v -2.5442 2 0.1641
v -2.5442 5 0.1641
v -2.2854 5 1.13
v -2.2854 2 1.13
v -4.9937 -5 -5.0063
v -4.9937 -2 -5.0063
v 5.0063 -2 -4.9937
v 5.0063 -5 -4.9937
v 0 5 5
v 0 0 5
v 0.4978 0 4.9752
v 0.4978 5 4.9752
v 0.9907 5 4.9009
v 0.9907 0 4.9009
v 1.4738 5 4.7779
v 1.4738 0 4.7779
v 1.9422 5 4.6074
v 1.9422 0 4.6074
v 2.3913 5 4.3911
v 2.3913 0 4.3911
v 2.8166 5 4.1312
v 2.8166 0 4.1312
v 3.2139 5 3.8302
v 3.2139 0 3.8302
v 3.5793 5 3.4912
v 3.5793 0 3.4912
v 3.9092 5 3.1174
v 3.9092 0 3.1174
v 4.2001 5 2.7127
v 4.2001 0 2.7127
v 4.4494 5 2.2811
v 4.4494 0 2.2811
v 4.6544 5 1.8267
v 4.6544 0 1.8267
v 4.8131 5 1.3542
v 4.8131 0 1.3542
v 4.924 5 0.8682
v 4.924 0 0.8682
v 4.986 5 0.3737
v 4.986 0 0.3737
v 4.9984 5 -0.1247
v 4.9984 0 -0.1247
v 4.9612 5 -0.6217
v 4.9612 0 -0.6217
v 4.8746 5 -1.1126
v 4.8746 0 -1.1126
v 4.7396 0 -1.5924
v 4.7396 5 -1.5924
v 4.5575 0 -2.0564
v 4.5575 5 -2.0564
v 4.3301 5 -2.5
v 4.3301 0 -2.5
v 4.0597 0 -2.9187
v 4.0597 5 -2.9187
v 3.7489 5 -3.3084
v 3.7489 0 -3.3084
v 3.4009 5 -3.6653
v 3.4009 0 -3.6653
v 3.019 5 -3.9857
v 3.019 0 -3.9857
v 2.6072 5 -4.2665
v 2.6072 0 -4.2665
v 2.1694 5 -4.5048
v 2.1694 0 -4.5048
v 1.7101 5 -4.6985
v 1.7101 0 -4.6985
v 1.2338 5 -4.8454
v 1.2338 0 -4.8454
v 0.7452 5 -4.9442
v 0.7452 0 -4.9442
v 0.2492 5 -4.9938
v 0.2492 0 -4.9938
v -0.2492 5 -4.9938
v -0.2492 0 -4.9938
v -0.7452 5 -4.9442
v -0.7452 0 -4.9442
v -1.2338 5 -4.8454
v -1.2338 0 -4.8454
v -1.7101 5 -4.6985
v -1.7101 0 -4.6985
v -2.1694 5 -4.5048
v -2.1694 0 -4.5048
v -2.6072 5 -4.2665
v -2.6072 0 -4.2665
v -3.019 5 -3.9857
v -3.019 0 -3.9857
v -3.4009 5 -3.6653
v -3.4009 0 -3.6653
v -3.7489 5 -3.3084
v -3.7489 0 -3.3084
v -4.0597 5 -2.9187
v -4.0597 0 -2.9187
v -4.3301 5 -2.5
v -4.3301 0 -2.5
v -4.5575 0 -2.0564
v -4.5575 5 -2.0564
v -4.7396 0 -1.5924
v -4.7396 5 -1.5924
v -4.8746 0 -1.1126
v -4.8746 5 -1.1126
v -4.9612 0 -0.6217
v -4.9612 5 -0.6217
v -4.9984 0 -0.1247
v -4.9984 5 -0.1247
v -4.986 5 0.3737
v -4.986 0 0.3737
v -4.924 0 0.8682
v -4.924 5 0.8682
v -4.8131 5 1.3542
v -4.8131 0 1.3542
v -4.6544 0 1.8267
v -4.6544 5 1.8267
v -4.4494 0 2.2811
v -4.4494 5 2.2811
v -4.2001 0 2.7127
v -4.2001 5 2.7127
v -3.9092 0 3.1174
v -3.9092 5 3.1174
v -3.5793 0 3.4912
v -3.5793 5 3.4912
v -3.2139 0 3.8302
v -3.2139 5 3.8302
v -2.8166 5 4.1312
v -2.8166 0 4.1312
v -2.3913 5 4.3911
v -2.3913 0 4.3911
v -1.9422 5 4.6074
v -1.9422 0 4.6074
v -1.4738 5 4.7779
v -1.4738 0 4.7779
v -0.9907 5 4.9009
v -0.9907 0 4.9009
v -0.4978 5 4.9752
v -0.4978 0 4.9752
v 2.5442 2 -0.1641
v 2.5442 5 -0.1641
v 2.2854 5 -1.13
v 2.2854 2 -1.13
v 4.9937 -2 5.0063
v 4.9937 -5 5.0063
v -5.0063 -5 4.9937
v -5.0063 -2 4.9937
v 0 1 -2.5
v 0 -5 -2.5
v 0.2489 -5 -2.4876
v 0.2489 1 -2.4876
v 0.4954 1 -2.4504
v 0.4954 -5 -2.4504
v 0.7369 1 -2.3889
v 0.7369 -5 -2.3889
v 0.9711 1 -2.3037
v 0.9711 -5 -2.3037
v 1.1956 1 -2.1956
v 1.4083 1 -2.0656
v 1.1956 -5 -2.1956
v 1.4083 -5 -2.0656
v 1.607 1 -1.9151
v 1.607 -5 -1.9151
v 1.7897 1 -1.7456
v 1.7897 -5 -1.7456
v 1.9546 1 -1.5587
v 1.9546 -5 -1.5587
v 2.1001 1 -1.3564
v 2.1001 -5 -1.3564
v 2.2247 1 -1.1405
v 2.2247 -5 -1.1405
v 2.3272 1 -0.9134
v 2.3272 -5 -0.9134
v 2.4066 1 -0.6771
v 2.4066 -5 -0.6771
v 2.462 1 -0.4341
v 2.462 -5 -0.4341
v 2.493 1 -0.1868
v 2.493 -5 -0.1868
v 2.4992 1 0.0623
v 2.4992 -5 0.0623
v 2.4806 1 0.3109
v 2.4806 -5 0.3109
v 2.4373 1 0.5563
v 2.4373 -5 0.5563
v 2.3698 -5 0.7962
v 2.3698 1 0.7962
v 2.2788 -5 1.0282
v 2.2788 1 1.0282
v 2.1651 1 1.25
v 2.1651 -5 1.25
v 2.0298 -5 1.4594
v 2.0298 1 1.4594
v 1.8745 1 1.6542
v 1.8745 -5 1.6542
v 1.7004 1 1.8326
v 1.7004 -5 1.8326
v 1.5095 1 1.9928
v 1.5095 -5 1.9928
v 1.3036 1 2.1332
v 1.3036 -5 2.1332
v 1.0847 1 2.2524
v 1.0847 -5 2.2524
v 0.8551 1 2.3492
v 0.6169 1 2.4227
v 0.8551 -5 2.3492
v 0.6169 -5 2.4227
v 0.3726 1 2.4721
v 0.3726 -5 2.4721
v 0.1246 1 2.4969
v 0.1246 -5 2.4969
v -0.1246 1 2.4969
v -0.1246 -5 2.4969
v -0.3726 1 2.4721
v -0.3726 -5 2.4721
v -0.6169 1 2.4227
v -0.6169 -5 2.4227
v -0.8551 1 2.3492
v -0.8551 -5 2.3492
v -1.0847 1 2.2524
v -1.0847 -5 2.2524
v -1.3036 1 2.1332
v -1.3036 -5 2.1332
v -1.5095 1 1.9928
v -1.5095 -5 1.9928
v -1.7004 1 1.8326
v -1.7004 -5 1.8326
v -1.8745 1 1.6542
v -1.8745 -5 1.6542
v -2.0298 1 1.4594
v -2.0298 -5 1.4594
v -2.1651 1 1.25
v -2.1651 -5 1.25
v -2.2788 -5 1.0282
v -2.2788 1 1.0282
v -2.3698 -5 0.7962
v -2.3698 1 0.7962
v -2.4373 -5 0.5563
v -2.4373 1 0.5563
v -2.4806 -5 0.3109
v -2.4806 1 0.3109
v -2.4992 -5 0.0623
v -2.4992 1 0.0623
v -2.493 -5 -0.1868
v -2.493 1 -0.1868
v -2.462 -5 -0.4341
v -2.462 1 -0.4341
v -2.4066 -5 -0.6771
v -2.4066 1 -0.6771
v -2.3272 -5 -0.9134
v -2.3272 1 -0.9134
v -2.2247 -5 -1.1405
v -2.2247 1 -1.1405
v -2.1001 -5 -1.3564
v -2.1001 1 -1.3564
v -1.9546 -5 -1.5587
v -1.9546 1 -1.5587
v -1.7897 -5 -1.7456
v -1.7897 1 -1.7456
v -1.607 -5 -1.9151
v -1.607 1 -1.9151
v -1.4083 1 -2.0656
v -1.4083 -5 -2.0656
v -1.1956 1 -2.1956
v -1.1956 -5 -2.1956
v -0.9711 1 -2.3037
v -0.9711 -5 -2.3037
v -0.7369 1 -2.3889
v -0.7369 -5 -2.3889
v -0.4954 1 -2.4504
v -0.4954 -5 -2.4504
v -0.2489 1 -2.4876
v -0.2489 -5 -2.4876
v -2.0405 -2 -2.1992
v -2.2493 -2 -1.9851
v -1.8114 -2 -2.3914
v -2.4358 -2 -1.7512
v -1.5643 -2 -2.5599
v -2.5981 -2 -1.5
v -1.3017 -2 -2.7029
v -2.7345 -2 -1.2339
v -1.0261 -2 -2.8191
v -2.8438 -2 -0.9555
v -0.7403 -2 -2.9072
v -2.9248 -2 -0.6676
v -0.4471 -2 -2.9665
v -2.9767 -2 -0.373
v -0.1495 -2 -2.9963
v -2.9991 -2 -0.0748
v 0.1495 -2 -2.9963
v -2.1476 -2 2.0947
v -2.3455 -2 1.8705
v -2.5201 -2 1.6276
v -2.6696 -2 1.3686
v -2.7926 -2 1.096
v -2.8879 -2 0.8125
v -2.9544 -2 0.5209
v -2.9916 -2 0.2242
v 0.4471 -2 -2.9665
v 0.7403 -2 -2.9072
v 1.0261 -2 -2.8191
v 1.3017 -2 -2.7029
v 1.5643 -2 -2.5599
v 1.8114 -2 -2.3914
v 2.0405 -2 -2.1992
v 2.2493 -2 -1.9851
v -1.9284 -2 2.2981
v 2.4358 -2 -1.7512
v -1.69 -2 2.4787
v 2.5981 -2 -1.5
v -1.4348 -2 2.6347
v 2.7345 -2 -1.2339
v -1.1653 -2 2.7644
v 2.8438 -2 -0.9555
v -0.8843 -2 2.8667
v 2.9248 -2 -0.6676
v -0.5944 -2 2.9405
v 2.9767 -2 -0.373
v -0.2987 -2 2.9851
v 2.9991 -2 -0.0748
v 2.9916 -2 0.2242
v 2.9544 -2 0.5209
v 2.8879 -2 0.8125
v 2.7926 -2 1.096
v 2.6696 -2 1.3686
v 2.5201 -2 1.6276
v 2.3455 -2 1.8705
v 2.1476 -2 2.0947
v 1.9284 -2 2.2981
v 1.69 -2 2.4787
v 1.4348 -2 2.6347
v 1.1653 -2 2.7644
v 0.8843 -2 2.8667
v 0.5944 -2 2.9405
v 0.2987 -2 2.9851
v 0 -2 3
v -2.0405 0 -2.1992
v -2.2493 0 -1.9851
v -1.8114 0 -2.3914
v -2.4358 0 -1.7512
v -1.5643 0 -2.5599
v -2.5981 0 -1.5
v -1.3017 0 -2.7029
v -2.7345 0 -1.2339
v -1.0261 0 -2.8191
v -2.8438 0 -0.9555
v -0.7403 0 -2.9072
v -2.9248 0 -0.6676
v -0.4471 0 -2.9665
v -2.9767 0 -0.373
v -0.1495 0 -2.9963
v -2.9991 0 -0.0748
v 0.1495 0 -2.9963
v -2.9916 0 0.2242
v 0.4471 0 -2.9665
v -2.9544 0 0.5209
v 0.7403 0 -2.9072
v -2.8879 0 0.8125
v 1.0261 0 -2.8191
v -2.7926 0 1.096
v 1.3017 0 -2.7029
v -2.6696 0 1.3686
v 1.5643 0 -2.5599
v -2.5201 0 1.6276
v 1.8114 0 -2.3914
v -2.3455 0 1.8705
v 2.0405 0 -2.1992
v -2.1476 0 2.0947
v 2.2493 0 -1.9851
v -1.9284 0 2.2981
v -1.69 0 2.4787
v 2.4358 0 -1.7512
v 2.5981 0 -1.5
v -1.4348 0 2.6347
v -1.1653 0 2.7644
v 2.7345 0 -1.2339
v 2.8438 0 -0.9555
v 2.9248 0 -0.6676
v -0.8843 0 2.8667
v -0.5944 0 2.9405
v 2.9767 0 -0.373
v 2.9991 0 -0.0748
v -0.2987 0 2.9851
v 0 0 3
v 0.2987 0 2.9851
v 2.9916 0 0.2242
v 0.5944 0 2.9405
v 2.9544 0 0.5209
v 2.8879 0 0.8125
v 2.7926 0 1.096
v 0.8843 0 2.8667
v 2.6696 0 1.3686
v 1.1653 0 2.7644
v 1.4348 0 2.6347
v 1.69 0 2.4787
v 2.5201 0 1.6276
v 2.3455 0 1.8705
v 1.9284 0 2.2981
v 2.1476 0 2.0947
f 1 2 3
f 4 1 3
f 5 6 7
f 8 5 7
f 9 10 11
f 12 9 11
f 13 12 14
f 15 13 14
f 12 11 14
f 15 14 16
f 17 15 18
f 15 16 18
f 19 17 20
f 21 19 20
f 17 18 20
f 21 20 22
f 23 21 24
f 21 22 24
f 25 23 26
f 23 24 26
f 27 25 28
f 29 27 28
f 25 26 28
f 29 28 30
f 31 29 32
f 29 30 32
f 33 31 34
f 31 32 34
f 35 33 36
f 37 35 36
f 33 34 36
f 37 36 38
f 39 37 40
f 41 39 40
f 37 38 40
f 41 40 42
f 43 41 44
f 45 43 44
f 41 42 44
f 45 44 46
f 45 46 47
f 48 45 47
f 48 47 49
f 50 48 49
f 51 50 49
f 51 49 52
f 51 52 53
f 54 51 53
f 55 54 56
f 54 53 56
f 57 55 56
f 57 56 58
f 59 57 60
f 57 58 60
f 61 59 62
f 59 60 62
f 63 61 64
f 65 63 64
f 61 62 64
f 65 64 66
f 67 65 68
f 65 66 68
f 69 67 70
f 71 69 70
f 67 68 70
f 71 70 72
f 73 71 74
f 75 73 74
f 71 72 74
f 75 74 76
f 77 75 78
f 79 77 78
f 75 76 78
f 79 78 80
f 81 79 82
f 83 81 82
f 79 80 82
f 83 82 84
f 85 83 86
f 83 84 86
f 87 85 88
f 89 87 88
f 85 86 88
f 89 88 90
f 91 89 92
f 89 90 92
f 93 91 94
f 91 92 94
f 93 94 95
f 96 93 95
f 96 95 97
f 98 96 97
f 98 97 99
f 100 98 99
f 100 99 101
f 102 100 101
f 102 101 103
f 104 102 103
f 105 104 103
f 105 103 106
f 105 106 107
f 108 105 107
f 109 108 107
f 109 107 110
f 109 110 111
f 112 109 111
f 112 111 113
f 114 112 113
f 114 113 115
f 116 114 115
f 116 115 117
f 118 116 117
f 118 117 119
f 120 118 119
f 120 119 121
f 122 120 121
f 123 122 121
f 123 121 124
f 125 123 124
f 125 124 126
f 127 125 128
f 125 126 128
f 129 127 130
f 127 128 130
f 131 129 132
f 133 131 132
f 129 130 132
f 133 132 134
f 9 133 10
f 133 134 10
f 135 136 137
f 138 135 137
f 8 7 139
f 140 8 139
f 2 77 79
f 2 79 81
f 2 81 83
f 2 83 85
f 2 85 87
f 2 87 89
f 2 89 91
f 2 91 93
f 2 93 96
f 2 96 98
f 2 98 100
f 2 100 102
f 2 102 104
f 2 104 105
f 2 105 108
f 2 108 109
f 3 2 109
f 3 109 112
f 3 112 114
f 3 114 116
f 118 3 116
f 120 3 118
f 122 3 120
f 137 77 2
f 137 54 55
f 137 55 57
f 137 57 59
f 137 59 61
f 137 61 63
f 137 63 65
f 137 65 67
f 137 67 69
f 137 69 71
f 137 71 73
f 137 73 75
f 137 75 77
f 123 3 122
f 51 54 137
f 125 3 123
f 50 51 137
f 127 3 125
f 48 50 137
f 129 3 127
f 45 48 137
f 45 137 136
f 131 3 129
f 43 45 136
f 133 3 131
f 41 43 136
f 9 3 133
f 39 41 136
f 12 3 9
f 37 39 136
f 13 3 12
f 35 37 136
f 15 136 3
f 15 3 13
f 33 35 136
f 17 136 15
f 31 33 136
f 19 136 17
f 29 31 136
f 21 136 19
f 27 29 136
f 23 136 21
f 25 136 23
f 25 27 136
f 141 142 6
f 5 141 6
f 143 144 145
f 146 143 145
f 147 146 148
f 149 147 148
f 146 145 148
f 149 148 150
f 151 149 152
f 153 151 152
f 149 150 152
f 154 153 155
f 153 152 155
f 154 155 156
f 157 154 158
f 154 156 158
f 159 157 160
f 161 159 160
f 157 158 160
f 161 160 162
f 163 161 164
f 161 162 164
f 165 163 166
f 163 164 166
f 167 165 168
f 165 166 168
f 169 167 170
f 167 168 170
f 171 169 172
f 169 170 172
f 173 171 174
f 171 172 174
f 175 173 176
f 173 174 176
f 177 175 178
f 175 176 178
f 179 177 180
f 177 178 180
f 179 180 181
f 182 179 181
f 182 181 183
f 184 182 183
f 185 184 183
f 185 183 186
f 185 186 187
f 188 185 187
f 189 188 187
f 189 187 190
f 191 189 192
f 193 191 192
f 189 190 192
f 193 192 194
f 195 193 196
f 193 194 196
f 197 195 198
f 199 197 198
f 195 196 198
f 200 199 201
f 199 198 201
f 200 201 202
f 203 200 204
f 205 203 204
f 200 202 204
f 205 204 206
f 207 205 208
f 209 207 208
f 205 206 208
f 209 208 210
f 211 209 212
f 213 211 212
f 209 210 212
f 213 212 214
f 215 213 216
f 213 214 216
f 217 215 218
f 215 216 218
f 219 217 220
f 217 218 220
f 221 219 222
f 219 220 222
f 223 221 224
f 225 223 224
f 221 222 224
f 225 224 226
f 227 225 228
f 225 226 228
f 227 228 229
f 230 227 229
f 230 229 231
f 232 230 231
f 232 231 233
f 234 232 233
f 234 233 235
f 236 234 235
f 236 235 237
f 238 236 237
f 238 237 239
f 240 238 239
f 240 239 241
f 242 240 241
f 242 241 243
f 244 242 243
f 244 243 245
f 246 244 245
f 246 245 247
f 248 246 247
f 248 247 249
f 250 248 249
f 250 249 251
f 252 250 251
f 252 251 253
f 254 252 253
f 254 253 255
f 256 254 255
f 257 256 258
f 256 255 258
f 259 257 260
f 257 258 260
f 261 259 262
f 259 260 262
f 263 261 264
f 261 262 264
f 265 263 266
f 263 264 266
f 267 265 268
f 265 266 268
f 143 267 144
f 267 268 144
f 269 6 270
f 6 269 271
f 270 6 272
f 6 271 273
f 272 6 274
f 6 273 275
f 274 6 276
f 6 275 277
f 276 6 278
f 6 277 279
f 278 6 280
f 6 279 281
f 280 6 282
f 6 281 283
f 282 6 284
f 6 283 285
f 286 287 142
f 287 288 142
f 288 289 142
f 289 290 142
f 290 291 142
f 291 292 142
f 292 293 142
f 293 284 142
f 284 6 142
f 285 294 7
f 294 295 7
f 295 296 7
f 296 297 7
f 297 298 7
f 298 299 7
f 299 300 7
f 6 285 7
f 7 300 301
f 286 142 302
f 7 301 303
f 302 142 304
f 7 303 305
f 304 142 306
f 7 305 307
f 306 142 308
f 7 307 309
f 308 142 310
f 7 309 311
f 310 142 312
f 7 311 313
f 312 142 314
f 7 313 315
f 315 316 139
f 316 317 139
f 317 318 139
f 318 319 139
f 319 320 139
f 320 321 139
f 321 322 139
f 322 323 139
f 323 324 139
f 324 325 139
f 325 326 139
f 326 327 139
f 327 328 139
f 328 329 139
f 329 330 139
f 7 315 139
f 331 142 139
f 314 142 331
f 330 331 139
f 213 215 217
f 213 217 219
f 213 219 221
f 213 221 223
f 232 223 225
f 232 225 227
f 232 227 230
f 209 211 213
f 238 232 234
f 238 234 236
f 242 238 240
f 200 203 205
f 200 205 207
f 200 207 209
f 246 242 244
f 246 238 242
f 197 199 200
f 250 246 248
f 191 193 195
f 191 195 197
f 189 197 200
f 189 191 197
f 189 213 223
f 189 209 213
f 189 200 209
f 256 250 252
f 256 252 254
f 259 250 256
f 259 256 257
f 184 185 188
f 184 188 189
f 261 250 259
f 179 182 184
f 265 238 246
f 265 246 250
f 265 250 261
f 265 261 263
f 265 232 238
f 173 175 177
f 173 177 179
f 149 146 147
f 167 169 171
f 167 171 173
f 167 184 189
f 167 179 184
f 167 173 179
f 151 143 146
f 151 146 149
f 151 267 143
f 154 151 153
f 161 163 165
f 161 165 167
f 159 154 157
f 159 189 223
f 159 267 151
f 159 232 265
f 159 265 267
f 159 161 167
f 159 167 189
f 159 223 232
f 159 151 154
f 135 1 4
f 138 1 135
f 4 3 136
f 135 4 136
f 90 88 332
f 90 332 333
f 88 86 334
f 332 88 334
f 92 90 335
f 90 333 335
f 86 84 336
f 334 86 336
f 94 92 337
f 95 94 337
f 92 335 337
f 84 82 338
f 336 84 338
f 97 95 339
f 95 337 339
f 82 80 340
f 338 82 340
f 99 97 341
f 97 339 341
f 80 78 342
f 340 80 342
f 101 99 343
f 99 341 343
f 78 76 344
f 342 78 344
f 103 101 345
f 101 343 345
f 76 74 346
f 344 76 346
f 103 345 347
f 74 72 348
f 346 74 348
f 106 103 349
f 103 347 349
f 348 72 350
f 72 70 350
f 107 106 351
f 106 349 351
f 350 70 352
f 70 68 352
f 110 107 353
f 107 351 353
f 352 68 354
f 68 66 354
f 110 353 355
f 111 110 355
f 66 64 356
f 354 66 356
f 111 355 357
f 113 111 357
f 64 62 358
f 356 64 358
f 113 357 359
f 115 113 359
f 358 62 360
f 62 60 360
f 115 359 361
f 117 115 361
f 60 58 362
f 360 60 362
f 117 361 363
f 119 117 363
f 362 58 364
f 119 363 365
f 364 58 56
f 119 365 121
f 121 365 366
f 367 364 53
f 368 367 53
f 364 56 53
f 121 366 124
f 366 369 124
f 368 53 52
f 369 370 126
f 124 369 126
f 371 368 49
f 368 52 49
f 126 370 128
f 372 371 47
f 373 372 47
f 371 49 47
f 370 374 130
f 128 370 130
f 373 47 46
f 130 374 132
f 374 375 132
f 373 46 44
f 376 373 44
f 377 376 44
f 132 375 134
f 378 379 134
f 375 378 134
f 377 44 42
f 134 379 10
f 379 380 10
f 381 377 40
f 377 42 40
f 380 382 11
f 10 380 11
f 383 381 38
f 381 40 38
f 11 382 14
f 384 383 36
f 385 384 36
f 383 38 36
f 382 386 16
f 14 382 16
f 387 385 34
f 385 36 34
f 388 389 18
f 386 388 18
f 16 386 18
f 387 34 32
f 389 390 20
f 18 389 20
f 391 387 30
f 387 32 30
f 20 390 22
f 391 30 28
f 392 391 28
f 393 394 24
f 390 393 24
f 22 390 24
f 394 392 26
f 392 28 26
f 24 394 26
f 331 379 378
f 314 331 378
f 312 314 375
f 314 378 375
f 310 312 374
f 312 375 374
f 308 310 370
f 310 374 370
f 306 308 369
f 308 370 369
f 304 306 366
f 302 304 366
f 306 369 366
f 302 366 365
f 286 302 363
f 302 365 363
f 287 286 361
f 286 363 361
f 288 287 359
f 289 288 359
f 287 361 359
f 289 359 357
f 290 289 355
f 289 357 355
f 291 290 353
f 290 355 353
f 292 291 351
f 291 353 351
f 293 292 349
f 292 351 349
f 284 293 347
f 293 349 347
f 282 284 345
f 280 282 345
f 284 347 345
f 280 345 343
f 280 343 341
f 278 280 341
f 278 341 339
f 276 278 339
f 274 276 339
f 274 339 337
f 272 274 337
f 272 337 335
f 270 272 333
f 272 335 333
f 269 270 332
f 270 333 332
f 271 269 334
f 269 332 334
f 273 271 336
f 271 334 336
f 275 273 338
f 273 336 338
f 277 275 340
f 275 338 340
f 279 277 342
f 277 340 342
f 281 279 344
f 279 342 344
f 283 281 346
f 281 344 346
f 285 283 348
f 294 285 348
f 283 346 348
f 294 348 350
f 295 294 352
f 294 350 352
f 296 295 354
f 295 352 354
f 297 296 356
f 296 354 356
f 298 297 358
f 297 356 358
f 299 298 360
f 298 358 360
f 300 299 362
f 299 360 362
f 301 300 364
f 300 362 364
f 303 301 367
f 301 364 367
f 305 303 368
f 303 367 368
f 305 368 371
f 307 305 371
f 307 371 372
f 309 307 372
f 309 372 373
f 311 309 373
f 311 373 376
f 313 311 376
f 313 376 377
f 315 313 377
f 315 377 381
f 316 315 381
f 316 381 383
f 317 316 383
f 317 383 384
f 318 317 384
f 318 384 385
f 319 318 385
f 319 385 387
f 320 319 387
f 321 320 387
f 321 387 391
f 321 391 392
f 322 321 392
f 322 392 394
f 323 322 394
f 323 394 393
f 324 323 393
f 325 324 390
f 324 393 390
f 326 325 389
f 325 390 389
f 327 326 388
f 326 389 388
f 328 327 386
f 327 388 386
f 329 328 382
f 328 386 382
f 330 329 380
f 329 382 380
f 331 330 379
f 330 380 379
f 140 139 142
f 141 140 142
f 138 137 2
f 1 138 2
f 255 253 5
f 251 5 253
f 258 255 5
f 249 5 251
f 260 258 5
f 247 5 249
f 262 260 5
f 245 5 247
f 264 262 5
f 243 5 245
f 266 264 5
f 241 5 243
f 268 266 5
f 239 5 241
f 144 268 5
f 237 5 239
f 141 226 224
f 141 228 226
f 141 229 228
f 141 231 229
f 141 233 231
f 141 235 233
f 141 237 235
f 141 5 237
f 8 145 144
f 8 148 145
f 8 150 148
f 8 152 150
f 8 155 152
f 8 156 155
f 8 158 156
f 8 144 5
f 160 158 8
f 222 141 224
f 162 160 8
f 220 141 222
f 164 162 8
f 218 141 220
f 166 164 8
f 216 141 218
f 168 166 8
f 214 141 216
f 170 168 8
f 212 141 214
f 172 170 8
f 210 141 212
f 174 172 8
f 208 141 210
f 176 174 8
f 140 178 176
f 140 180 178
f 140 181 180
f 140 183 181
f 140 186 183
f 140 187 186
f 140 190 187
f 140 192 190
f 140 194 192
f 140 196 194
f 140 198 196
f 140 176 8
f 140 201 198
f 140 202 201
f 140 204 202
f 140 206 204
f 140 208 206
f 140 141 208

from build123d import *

# Parameters (mm, degrees)
SKETCH_1_R          = 5
EXTRUDE_1_DEPTH     = 5
SKETCH_3_R          = 3
EXTRUDE_2_DEPTH     = 2
EXTRUDE_3_DEPTH     = 3
SKETCH_5_R          = 2.5
CUT_EXTRUDE_2_DEPTH = 6
CUT_EXTRUDE_1_DEPTH = 3


with BuildPart() as part:
    # 草图1 → 凸台-拉伸1 (new body)
    with BuildSketch(Plane(origin=(0, 0, 0), x_dir=(1, 0, 0), z_dir=(0, 1, 0))):
        with Locations(Location((0, 0, 0), (0, 0, 270))):
            Circle(SKETCH_1_R)
    extrude(amount=EXTRUDE_1_DEPTH)

    # 草图3 → 凸台-拉伸2 (add)
    with BuildSketch(Plane.XZ):
        with Locations(Location((0, 0, 0), (0, 0, 90))):
            Circle(SKETCH_3_R)
    extrude(amount=EXTRUDE_2_DEPTH)

    # 草图4 → 凸台-拉伸3 (add)
    with BuildSketch(Plane.XZ.offset(2)):
        Polygon((4.993690859, 5.00630119), (-5.00630119, 4.993690859), (-4.993690859, -5.00630119), (5.00630119, -4.993690859), align=None)
    extrude(amount=EXTRUDE_3_DEPTH)

    # 草图5 → 切除-拉伸2 (cut)
    with BuildSketch(Plane.XZ.offset(5)):
        with Locations(Location((0, 0, 0), (0, 0, 270))):
            Circle(SKETCH_5_R)
    extrude(amount=-CUT_EXTRUDE_2_DEPTH, mode=Mode.SUBTRACT)

    # 草图2 → 切除-拉伸1 (cut)
    with BuildSketch(Plane(origin=(0, 5, 0), x_dir=(1, 0, 0), z_dir=(0, 1, 0))):
        Polygon((-2.285405043, -1.130010526), (2.544224088, 0.1640847), (2.285405043, 1.130010526), (-2.544224088, -0.1640847), align=None)
    extrude(amount=-CUT_EXTRUDE_1_DEPTH, mode=Mode.SUBTRACT)


solid = part.part
